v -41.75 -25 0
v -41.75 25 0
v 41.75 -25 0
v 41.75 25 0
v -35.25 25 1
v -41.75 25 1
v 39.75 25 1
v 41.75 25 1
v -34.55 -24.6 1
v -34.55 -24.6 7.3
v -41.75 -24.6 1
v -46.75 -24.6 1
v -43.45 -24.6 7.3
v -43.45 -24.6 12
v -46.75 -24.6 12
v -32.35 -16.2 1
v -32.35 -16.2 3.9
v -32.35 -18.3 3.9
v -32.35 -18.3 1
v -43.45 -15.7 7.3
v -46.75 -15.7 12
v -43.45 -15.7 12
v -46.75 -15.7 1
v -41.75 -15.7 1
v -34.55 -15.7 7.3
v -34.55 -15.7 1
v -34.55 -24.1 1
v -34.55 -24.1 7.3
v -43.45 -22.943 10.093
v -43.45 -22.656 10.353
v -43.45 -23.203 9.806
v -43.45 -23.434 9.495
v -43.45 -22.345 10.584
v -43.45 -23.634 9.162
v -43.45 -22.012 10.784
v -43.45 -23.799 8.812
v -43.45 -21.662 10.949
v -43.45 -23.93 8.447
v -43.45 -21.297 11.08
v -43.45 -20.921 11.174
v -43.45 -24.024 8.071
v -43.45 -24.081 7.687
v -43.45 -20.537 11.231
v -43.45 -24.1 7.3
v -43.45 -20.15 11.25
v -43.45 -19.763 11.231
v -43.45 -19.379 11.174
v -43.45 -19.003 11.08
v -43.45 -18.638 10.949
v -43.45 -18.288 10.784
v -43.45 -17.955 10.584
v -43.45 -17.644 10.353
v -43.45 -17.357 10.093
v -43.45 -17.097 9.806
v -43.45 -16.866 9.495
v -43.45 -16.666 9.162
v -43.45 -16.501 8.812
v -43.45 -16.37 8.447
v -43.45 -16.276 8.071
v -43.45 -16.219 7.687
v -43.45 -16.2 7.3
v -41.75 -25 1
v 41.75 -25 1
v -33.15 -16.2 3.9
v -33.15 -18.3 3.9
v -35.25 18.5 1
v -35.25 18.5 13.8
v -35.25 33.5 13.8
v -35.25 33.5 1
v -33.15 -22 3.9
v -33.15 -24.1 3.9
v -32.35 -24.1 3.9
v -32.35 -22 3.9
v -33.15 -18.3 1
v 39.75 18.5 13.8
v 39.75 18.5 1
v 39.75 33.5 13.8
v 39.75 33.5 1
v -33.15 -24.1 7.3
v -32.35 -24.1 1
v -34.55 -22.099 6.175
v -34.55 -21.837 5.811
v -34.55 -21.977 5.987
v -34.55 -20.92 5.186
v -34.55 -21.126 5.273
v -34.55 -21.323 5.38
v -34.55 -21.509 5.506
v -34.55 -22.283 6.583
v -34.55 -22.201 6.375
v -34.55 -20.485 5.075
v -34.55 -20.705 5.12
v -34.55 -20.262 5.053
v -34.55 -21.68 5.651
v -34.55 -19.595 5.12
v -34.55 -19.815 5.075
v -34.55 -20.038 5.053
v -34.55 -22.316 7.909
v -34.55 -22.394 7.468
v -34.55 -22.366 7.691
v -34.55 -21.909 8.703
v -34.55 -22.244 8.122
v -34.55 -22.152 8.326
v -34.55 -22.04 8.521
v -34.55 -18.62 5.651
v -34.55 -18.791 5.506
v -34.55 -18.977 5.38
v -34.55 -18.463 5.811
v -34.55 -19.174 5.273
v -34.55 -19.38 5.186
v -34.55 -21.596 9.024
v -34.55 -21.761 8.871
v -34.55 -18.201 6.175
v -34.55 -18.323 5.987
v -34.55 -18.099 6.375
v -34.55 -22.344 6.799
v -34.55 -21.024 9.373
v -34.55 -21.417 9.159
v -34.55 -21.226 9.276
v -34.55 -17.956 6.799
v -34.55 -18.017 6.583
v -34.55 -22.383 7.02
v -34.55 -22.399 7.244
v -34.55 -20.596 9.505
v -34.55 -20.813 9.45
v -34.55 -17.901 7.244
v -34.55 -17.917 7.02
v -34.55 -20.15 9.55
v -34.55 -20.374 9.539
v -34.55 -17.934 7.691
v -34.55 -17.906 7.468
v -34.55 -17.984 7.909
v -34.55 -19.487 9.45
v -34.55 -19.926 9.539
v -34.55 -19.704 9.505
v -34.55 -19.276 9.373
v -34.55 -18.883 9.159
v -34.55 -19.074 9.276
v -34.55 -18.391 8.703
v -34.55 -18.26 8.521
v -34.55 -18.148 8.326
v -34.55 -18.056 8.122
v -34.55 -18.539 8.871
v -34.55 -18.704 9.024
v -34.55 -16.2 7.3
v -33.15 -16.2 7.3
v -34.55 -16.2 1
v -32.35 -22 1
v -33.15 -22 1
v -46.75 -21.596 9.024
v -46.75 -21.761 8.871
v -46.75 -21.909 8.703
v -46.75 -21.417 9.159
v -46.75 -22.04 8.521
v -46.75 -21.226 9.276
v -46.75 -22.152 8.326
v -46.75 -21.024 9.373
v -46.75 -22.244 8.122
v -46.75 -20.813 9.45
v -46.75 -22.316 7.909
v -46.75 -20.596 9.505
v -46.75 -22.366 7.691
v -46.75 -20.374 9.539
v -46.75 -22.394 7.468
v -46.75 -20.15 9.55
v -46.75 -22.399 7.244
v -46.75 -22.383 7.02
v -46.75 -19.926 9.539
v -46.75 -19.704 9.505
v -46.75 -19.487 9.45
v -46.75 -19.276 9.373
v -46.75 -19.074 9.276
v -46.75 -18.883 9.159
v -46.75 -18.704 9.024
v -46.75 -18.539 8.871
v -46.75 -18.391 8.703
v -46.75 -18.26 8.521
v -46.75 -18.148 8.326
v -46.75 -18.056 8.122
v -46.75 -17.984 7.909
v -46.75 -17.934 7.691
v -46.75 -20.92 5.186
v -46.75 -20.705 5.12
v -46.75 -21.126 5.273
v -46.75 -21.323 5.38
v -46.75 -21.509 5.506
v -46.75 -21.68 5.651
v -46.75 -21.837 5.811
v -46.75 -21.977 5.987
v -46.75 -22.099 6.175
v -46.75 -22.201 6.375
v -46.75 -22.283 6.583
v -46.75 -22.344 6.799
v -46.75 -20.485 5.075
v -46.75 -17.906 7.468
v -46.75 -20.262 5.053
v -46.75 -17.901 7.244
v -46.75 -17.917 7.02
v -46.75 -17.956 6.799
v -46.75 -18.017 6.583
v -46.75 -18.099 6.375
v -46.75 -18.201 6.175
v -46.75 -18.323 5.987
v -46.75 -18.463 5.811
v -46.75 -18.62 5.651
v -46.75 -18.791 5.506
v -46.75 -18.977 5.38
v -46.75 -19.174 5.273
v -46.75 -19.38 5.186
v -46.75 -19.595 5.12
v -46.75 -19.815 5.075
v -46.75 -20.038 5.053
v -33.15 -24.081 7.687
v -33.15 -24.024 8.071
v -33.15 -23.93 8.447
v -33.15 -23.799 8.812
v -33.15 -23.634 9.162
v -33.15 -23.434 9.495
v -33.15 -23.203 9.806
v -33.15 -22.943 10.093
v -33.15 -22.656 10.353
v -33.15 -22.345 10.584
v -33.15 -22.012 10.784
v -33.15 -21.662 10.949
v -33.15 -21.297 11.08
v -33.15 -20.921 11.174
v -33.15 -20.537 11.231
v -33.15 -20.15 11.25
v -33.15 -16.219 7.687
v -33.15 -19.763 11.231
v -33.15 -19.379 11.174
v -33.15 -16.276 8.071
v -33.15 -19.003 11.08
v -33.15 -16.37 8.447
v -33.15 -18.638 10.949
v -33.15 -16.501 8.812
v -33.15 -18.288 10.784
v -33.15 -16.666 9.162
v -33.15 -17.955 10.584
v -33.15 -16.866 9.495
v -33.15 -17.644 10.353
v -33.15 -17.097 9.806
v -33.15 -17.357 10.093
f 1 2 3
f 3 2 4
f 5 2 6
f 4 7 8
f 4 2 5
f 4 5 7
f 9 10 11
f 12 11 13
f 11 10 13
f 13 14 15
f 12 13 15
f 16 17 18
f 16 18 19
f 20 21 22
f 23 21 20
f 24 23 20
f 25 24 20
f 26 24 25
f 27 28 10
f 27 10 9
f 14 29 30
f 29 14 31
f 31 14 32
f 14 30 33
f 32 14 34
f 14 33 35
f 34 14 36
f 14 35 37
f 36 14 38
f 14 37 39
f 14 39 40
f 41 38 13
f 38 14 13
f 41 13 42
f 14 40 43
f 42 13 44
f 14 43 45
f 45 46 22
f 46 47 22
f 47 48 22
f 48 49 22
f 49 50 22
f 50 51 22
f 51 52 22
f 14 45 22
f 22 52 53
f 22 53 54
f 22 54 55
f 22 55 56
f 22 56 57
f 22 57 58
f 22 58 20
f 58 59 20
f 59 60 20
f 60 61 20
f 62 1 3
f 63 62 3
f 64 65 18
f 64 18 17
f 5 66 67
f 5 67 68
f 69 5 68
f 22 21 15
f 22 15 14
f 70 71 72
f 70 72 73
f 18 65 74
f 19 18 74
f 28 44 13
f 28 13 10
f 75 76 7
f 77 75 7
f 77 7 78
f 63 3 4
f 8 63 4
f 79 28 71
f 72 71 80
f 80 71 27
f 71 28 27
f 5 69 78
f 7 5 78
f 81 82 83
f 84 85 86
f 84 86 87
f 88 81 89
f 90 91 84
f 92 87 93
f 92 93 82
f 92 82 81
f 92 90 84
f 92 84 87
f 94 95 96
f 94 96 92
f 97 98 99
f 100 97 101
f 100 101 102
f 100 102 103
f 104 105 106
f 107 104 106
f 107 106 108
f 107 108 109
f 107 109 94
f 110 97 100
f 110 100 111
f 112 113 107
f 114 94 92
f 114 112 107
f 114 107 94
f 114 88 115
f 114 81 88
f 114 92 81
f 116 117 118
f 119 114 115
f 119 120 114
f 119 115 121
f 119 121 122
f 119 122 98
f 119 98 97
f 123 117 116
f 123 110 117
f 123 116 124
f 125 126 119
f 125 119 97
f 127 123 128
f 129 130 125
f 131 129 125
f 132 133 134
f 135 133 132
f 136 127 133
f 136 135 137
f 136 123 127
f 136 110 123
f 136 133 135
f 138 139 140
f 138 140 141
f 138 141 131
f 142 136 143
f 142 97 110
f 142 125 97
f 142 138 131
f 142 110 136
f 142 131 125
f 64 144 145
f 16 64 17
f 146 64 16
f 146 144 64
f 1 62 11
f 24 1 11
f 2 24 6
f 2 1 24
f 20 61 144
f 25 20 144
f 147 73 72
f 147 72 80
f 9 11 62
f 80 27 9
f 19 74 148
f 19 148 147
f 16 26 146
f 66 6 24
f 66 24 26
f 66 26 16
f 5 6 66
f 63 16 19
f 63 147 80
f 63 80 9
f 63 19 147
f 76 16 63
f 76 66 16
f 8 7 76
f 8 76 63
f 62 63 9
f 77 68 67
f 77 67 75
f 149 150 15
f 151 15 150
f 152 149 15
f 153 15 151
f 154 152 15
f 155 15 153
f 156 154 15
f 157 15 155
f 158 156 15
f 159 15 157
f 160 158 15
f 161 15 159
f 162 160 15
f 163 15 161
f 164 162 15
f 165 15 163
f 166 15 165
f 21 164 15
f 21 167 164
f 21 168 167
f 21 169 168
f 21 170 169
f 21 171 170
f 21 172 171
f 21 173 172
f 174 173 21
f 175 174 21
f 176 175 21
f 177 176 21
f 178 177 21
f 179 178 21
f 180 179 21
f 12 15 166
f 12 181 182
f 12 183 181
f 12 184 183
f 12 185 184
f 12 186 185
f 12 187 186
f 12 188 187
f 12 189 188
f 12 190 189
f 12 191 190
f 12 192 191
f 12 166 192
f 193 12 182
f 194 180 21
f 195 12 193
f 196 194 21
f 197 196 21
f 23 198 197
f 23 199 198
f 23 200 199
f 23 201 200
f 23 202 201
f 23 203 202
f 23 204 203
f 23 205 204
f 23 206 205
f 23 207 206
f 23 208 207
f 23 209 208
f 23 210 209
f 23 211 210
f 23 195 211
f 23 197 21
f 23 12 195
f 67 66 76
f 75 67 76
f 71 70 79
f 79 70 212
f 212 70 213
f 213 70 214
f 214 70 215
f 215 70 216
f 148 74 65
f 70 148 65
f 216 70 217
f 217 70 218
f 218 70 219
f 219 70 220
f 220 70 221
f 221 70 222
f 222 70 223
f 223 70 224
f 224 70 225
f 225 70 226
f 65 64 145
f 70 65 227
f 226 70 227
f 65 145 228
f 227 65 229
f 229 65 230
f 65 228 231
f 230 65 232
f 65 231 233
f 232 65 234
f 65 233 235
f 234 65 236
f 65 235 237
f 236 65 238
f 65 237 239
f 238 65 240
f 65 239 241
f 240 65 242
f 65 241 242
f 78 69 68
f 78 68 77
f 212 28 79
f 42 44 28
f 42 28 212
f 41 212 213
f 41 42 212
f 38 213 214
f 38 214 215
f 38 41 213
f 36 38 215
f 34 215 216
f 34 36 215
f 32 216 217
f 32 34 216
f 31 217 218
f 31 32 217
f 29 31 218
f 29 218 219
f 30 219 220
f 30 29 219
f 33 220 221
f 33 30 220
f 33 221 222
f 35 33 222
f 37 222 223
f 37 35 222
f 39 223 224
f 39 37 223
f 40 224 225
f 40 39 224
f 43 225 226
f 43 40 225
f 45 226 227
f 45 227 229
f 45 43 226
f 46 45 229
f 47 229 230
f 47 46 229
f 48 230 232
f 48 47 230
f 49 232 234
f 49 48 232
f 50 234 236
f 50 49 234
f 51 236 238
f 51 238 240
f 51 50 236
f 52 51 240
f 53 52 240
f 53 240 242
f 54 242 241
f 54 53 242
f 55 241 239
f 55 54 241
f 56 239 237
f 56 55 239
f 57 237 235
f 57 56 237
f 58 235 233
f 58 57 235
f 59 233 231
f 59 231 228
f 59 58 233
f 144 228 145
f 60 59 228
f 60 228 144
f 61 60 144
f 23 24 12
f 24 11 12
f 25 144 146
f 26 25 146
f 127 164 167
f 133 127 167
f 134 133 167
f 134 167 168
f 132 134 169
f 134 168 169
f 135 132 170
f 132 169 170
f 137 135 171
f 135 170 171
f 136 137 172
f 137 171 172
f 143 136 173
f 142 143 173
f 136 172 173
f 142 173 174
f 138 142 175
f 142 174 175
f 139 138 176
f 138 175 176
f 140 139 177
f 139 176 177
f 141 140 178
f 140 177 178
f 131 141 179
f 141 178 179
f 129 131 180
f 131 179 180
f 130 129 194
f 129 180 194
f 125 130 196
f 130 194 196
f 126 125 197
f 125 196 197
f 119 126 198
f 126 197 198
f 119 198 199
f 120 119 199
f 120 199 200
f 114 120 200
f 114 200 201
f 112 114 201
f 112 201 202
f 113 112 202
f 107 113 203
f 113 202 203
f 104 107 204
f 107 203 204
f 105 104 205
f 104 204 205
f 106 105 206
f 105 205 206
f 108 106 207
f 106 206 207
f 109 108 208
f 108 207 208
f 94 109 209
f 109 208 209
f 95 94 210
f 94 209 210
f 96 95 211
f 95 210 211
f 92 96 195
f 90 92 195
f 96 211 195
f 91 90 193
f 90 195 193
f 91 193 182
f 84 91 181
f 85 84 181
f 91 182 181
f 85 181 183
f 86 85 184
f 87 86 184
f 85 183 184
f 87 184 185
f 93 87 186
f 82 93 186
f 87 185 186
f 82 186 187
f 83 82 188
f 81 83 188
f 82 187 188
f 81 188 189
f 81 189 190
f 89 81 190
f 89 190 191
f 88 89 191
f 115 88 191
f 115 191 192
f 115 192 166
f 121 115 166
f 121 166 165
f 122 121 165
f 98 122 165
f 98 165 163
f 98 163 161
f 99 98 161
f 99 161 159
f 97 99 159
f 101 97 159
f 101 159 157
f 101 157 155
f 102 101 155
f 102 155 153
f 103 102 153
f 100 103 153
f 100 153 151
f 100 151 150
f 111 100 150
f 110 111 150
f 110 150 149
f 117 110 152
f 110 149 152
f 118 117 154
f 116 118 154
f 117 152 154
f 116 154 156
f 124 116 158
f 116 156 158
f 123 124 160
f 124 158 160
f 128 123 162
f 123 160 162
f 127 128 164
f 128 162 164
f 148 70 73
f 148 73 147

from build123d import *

# Parameters (mm, degrees)
SKETCH1_W           = 83.5
SKETCH1_H           = 50
BOSS_EXTRUDE1_DEPTH = 1
SKETCH2_W           = 75
SKETCH2_H           = 15
BOSS_EXTRUDE2_DEPTH = 12.8
SKETCH3_W           = 3.3
SKETCH3_H           = 8.9
BOSS_EXTRUDE3_DEPTH = 11
BOSS_EXTRUDE4_DEPTH = 10.3
BOSS_EXTRUDE6_DEPTH = 0.5
BOSS_EXTRUDE7_DEPTH = 0.5
SKETCH7_W           = 2.9
SKETCH7_H           = 2.1
BOSS_EXTRUDE8_DEPTH = 0.8
SKETCH8_R           = 2.25
CUT_EXTRUDE1_DEPTH  = 12.2


with BuildPart() as part:
    # Sketch1 → Boss-Extrude1 (new body)
    with BuildSketch(Plane.XY):
        Rectangle(SKETCH1_W, SKETCH1_H)
    extrude(amount=BOSS_EXTRUDE1_DEPTH)

    # Sketch2 → Boss-Extrude2 (add)
    with BuildSketch(Plane.XY.offset(1)):
        with Locations((2.25, 26)):
            Rectangle(SKETCH2_W, SKETCH2_H)
    extrude(amount=BOSS_EXTRUDE2_DEPTH)



with BuildPart() as body_2:
    # Sketch3 → Boss-Extrude3 (new body)
    with BuildSketch(Plane.XY.offset(1)):
        with Locations((-45.1, -20.15)):
            Rectangle(SKETCH3_W, SKETCH3_H)
    extrude(amount=BOSS_EXTRUDE3_DEPTH)


with BuildPart() as part_1:
    add(part.part)

    add(body_2.part)  # Boss-Extrude4 merges body 2
    # Sketch4 → Boss-Extrude4 (add)
    with BuildSketch(Plane(origin=(-43.45, 0, 0), x_dir=(0, 0, -1), z_dir=(1, 0, 0))):
        with BuildLine():
            Line((-7.3, -16.2), (-1, -16.2))
            Line((-1, -16.2), (-1, -24.1))
            Line((-1, -24.1), (-7.3, -24.1))
            ThreePointArc((-7.3, -24.1), (-11.25, -20.15), (-7.3, -16.2))
        make_face()
    extrude(amount=BOSS_EXTRUDE4_DEPTH)

    # Sketch5 → Boss-Extrude6 (add)
    with BuildSketch(Plane.XZ.offset(24.1)):
        Polygon((-34.55, 7.3), (-34.55, 1), (-41.75, 1), (-43.45, 1), (-43.45, 7.3), align=None)
    extrude(amount=BOSS_EXTRUDE6_DEPTH)

    # Sketch6 → Boss-Extrude7 (add)
    with BuildSketch(Plane(origin=(0, -16.2, 0), x_dir=(1, 0, 0), z_dir=(0, 1, 0))):
        Polygon((-43.45, -7.3), (-34.55, -7.3), (-34.55, -1), (-41.75, -1), (-43.45, -1), align=None)
    extrude(amount=BOSS_EXTRUDE7_DEPTH)

    # Sketch7 → Boss-Extrude8 (add)
    with BuildSketch(Plane(origin=(-33.15, 0, 0), x_dir=(0, 0, -1), z_dir=(1, 0, 0))):
        with Locations((-2.45, -23.05)):
            Rectangle(SKETCH7_W, SKETCH7_H)
        with Locations((-2.45, -17.25)):
            Rectangle(SKETCH7_W, SKETCH7_H)
    extrude(amount=BOSS_EXTRUDE8_DEPTH)

    # Sketch8 → Cut-Extrude1 (cut)
    with BuildSketch(Plane.ZY.offset(46.75)):
        with Locations((7.3, -20.15)):
            Circle(SKETCH8_R)
    extrude(amount=-CUT_EXTRUDE1_DEPTH, mode=Mode.SUBTRACT)


solid = part_1.part
